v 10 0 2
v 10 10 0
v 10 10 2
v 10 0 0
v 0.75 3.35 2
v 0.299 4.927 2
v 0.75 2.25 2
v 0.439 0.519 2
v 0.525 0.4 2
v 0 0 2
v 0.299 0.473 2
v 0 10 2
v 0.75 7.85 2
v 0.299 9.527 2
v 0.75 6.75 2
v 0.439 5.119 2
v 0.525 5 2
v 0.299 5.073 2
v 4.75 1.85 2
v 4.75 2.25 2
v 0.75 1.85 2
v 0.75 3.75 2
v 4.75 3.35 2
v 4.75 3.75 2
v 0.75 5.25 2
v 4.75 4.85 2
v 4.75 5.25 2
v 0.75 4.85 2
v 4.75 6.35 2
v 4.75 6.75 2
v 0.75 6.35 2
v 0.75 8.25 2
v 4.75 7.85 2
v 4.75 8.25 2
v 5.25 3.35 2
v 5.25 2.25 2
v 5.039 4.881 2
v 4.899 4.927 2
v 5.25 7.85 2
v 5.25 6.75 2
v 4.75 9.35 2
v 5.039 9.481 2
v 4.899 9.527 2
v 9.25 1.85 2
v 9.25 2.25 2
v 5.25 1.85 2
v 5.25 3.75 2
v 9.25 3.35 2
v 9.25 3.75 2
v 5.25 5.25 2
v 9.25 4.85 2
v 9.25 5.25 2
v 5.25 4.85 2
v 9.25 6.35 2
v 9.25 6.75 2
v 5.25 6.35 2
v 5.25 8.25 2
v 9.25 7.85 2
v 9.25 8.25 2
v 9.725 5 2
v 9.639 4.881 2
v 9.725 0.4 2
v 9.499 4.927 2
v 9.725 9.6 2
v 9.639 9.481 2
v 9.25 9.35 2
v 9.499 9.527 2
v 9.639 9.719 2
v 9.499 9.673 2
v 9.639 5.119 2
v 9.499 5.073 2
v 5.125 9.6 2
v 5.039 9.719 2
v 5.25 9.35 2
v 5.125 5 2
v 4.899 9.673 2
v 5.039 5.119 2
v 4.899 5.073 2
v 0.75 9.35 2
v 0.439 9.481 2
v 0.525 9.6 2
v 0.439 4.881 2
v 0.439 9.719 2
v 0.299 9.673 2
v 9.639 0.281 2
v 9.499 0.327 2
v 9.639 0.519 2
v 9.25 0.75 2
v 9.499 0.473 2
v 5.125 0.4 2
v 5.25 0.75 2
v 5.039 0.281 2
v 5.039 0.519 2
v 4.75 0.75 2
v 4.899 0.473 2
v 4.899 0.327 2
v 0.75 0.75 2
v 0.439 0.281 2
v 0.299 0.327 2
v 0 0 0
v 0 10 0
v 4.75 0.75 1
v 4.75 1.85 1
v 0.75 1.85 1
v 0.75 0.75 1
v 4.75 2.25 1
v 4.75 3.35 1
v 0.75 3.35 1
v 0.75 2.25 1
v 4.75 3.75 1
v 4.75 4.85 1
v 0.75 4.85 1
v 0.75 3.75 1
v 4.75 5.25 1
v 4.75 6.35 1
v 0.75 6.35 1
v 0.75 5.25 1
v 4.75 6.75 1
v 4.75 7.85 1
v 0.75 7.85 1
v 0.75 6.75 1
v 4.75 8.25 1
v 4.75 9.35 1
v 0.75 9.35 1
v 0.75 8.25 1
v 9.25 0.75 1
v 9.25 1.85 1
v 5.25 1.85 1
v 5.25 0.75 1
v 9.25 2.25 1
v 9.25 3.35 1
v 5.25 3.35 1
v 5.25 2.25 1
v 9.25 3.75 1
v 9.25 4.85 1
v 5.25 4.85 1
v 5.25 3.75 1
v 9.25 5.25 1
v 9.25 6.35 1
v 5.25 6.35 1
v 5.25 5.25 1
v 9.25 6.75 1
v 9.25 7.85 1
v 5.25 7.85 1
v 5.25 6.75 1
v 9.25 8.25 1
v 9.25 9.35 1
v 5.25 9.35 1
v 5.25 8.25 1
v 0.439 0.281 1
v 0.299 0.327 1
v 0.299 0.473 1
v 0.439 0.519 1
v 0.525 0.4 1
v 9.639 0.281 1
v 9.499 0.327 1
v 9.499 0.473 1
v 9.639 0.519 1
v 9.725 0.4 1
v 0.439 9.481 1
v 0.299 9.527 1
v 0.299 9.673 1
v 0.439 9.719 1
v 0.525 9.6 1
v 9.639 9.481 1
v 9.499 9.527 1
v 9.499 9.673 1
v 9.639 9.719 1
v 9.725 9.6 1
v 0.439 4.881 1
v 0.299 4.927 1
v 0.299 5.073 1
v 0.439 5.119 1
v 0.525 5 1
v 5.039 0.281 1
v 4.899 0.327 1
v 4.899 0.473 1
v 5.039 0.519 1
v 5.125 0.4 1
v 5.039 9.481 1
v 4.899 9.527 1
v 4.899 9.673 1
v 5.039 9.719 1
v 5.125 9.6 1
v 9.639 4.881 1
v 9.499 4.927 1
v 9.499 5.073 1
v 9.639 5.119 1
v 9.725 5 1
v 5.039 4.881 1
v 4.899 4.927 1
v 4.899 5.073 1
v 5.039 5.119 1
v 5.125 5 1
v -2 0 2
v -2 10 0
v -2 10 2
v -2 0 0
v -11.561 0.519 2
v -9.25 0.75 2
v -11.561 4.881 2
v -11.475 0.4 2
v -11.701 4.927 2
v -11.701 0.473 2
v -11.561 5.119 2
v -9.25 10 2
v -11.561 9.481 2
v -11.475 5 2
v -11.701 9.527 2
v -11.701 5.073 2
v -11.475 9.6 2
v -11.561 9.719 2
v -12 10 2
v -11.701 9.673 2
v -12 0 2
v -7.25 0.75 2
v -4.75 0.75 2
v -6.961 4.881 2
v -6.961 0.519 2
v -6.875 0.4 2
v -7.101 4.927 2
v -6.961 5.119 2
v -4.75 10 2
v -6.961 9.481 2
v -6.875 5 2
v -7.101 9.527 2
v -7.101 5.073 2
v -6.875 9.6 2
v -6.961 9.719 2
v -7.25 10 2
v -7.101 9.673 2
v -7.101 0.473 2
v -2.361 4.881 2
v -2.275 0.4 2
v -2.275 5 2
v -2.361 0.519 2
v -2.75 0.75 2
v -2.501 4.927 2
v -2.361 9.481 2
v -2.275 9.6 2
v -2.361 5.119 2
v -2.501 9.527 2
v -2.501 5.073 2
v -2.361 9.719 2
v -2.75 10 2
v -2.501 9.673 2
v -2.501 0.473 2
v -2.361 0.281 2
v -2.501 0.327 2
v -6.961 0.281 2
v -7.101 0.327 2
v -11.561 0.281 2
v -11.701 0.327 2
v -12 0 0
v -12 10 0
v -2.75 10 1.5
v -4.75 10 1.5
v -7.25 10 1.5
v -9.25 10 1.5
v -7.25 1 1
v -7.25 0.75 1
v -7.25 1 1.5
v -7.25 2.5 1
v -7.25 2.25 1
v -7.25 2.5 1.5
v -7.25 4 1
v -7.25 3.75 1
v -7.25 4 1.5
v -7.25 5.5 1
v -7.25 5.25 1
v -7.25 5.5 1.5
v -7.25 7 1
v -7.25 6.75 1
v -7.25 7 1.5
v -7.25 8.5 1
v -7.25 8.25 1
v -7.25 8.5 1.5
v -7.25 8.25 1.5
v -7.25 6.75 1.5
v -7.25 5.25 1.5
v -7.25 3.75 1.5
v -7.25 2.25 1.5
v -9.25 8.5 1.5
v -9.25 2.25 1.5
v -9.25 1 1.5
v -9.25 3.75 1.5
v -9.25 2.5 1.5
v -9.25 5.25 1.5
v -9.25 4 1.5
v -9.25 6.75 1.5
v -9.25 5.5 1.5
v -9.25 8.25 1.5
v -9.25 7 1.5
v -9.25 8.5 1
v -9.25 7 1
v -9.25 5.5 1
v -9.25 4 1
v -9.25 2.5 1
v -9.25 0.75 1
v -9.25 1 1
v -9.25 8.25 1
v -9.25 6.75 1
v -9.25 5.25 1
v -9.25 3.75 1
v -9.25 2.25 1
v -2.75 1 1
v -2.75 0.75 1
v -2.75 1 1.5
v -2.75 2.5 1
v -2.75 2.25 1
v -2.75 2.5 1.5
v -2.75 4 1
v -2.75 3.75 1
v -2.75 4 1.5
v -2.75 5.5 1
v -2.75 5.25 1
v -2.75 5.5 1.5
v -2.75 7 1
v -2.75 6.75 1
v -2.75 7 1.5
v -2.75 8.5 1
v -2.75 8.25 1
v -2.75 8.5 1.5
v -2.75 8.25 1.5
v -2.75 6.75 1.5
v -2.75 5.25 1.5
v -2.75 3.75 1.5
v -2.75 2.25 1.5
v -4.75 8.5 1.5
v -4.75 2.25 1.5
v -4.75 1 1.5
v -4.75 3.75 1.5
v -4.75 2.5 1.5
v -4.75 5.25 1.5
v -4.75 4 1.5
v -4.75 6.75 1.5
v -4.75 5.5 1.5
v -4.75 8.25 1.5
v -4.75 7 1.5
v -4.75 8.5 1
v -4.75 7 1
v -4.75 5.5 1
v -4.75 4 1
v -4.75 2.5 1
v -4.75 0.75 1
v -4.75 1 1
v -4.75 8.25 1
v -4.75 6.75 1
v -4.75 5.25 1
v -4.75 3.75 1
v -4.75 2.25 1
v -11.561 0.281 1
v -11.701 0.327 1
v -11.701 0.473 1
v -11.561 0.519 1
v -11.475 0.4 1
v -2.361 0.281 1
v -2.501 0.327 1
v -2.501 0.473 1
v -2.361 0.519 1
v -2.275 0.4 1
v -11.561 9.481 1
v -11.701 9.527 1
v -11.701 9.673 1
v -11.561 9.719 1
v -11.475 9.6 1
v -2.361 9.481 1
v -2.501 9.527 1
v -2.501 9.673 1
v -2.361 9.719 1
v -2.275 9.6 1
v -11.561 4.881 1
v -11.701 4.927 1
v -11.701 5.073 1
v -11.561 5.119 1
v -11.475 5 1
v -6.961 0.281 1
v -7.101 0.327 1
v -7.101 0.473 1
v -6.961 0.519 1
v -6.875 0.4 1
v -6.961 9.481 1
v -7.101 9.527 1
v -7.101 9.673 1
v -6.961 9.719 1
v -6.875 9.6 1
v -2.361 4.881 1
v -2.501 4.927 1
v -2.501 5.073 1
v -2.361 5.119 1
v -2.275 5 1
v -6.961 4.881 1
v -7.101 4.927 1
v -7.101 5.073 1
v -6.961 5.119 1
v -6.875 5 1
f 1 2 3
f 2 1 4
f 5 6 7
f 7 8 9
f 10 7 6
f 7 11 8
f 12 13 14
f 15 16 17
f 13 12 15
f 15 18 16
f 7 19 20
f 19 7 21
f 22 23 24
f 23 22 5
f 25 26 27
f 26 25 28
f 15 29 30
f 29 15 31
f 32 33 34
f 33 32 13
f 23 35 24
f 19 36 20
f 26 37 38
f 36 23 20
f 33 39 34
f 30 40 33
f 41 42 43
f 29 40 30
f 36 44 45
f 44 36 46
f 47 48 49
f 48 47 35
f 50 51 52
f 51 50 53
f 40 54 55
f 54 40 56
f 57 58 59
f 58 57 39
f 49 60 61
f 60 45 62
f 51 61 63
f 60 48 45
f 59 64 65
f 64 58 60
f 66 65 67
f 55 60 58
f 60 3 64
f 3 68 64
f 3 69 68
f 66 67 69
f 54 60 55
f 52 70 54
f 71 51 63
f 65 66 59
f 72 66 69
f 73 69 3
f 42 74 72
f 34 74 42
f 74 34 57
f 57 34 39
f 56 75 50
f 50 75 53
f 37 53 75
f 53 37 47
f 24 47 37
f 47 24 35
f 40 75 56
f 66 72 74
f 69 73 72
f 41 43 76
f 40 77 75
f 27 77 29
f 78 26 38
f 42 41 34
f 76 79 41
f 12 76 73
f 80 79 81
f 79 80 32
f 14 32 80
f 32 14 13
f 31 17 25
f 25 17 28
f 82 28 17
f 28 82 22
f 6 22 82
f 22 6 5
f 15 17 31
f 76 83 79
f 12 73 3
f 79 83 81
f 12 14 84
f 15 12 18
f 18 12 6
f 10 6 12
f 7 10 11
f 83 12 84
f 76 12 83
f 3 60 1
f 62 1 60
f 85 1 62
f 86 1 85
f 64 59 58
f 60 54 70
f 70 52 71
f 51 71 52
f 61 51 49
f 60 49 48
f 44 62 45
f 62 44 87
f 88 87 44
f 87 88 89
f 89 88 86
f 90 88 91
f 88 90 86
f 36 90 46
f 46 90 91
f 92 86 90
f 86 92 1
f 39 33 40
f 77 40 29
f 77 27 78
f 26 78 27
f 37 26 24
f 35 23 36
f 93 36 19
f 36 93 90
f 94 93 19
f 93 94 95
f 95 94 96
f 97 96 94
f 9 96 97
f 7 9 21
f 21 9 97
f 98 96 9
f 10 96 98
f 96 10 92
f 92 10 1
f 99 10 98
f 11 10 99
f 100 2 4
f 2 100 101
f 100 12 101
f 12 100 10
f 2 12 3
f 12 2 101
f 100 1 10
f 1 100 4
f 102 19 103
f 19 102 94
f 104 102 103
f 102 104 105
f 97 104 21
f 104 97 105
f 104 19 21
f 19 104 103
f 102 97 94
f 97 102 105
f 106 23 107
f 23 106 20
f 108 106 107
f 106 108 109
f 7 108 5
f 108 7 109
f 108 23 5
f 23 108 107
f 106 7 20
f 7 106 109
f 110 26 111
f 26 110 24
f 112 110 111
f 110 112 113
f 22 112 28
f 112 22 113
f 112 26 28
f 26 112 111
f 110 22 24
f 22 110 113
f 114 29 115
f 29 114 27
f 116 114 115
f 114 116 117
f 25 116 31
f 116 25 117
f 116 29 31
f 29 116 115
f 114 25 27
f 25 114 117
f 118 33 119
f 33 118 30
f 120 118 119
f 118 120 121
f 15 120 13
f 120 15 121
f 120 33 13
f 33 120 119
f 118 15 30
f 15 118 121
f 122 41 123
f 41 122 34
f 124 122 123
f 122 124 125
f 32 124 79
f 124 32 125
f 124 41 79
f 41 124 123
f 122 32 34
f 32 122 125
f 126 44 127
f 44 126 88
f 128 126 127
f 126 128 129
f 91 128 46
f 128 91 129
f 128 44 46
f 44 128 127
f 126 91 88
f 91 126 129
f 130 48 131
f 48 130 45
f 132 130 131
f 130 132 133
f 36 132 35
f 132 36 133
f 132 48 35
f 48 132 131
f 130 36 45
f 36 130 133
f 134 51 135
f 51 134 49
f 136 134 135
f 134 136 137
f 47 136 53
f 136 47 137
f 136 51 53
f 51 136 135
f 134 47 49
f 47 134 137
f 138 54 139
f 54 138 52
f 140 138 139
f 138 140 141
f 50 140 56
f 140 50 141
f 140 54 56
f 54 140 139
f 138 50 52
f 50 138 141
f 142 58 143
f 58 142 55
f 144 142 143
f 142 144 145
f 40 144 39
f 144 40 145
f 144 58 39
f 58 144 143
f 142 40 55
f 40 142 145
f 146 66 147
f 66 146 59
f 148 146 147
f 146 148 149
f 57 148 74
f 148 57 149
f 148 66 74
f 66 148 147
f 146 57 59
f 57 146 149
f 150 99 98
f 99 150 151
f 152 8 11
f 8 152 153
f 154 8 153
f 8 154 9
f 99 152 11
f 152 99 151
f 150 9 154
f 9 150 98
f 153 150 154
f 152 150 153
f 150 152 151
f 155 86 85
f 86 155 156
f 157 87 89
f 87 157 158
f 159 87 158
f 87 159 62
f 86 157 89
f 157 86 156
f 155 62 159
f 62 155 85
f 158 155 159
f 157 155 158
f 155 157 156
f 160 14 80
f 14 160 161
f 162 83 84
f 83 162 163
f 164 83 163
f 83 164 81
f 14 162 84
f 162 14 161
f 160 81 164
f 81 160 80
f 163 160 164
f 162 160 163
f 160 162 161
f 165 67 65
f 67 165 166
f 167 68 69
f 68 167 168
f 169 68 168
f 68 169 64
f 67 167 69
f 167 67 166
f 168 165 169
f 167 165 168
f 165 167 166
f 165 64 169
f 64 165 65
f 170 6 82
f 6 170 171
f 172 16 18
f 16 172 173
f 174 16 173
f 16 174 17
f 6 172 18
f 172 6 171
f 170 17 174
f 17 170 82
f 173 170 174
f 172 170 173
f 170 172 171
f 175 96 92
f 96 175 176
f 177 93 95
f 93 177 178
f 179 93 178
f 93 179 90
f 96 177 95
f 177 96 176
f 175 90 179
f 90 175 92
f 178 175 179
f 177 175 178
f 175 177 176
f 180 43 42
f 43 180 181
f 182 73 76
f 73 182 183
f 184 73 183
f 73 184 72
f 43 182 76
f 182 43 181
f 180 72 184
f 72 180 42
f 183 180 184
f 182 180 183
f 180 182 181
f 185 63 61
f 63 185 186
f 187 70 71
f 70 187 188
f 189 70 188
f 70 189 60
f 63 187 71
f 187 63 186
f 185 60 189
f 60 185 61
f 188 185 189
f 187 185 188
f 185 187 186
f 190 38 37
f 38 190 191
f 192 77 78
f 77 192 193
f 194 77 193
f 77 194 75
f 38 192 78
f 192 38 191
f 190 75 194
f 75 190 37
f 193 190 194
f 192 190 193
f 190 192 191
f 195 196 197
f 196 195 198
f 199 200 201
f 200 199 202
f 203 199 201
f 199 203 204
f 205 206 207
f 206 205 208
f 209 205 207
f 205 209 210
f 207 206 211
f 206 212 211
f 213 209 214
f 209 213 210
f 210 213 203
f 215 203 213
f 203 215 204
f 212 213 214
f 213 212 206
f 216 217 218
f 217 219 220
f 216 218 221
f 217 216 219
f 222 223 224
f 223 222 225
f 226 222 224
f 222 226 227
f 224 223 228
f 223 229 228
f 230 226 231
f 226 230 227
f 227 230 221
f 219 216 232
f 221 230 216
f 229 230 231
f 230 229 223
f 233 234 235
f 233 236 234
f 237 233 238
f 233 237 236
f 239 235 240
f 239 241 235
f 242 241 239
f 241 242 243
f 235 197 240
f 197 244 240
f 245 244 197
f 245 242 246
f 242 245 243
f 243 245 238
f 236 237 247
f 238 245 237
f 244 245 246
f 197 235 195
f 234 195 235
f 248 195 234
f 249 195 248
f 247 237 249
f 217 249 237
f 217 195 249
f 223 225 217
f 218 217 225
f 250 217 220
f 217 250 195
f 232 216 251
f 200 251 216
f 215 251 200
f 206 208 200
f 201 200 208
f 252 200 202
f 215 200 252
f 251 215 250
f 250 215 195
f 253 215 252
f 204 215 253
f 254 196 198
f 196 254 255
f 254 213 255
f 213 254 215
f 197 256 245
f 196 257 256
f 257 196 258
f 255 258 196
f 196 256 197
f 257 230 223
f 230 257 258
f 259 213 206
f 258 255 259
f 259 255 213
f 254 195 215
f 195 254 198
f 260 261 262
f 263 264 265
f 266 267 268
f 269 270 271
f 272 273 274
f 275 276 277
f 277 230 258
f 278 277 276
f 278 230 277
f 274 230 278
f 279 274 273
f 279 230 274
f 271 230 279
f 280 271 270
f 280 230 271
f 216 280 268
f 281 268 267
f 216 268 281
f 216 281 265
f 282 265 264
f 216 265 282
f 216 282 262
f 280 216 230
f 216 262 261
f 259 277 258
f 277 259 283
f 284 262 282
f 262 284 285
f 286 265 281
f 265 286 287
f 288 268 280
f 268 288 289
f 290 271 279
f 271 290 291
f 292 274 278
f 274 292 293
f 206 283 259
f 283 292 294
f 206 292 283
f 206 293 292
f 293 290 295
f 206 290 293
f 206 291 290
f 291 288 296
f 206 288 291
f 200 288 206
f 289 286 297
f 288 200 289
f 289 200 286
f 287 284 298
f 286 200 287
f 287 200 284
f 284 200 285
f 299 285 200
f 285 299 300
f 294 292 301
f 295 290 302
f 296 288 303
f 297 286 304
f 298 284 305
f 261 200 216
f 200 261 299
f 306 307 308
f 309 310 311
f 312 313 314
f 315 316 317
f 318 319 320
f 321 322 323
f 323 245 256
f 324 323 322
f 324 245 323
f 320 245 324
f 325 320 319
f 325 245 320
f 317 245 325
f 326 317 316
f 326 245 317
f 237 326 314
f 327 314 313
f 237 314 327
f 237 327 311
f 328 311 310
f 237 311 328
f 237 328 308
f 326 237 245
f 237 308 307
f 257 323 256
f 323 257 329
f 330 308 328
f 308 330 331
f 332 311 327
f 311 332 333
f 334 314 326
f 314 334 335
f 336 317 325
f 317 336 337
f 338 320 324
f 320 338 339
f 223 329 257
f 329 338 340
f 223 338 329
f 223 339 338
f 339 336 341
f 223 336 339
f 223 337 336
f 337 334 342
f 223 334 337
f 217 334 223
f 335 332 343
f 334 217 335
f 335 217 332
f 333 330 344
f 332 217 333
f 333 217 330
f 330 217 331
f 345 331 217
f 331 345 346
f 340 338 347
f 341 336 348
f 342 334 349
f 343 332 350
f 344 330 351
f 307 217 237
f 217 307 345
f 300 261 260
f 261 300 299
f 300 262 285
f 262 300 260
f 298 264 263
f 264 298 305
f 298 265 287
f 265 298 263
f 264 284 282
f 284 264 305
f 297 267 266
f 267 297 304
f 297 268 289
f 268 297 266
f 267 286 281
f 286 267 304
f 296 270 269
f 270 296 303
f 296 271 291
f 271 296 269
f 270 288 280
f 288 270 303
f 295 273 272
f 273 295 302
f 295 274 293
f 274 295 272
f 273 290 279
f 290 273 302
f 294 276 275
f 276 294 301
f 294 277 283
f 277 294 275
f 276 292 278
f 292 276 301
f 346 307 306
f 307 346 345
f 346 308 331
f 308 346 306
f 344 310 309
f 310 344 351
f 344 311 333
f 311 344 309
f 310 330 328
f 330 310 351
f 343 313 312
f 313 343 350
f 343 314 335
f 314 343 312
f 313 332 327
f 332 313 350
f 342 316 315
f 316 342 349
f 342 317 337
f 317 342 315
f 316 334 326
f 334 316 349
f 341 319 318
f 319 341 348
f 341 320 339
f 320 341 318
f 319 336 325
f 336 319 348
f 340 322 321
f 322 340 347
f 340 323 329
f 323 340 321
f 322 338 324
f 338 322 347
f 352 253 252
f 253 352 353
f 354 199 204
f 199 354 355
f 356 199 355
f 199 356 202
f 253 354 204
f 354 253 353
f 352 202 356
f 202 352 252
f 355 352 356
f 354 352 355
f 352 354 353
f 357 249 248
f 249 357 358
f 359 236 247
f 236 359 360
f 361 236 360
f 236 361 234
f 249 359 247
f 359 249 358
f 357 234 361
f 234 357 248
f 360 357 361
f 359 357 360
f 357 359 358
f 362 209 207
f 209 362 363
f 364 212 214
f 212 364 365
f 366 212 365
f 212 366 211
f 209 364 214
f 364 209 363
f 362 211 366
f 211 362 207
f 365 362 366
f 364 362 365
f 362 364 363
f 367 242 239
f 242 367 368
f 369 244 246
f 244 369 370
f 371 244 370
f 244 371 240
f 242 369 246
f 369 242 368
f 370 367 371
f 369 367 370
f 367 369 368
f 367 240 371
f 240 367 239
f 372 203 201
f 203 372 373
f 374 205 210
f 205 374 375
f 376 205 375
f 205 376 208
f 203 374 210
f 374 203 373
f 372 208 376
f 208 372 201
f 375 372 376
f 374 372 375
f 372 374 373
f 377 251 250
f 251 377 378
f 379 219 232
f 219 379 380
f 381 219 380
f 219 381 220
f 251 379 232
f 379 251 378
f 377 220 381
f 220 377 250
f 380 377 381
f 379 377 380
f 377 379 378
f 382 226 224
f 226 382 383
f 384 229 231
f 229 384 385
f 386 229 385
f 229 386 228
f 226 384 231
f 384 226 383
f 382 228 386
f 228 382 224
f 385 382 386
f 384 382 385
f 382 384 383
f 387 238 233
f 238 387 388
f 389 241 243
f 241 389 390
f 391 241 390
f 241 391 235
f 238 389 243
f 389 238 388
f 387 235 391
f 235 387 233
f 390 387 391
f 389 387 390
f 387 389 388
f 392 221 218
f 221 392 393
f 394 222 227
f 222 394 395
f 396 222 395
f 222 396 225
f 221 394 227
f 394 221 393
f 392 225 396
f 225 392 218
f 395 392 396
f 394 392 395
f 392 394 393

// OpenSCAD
Top();
translate([-12,0,0]) Bottom();

Width=10;
Length=10;
Height=2;

//drive offset
DriveOffsetX1=0.75;
DriveOffsetX2=5.25;
DriveOffsetY=0;
DriveOffsetZ=1;

//drive spacing
DriveSpace=0.4;
DriveInset=1;

//drive demintions
DriveLength=5.75;
DriveWidth=4;
DriveHeight=1.1;

//supports
SupportOffset=0.4;
SupportRadius=1/8;

//bottom cutouts
cablegrooveX=0;
connectorCutX=2;
connectorCutY=0.25;
connectorCutZ=1;
connectorOffX1=DriveOffsetX1+DriveWidth-connectorCutX;
connectorOffX2=DriveOffsetX2+DriveWidth-connectorCutX;

module Top()
{
difference()
	{
	cube([Width,Length,Height]);
	translate([DriveOffsetX1,0.75+DriveSpace*0+DriveHeight*0,DriveOffsetZ]) cube([DriveWidth,DriveHeight,DriveInset]);
	translate([DriveOffsetX1,0.75+DriveSpace*1+DriveHeight*1,DriveOffsetZ]) cube([DriveWidth,DriveHeight,DriveInset]);
	translate([DriveOffsetX1,0.75+DriveSpace*2+DriveHeight*2,DriveOffsetZ]) cube([DriveWidth,DriveHeight,DriveInset]);
	translate([DriveOffsetX1,0.75+DriveSpace*3+DriveHeight*3,DriveOffsetZ]) cube([DriveWidth,DriveHeight,DriveInset]);
	translate([DriveOffsetX1,0.75+DriveSpace*4+DriveHeight*4,DriveOffsetZ]) cube([DriveWidth,DriveHeight,DriveInset]);
	translate([DriveOffsetX1,0.75+DriveSpace*5+DriveHeight*5,DriveOffsetZ]) cube([DriveWidth,DriveHeight,DriveInset]);

	translate([DriveOffsetX2,0.75+DriveSpace*0+DriveHeight*0,DriveOffsetZ]) cube([DriveWidth,DriveHeight,DriveInset]);
	translate([DriveOffsetX2,0.75+DriveSpace*1+DriveHeight*1,DriveOffsetZ]) cube([DriveWidth,DriveHeight,DriveInset]);
	translate([DriveOffsetX2,0.75+DriveSpace*2+DriveHeight*2,DriveOffsetZ]) cube([DriveWidth,DriveHeight,DriveInset]);
	translate([DriveOffsetX2,0.75+DriveSpace*3+DriveHeight*3,DriveOffsetZ]) cube([DriveWidth,DriveHeight,DriveInset]);
	translate([DriveOffsetX2,0.75+DriveSpace*4+DriveHeight*4,DriveOffsetZ]) cube([DriveWidth,DriveHeight,DriveInset]);
	translate([DriveOffsetX2,0.75+DriveSpace*5+DriveHeight*5,DriveOffsetZ]) cube([DriveWidth,DriveHeight,DriveInset]);

	translate([SupportOffset,SupportOffset,1]) cylinder (h=1,r=SupportRadius);
	translate([Width-SupportOffset,SupportOffset,1]) cylinder (h=1,r=SupportRadius);
	translate([SupportOffset,Length-SupportOffset,1]) cylinder (h=1,r=SupportRadius);
	translate([Width-SupportOffset,Length-SupportOffset,1]) cylinder (h=1,r=SupportRadius);

	translate([SupportOffset,Length/2,1]) cylinder (h=1,r=SupportRadius);
	translate([Width/2,SupportOffset,1]) cylinder (h=1,r=SupportRadius);
	translate([Width/2,Length-SupportOffset,1]) cylinder (h=1,r=SupportRadius);
	translate([Width-SupportOffset,Length/2,1]) cylinder (h=1,r=SupportRadius);

	translate([Width/2,Length/2,1]) cylinder (h=1,r=SupportRadius);
	}
}

module Bottom()
{
difference()
	{
	cube([Width,Length,Height]);
	translate([2.75,.75,1.5]) cube([connectorCutX,11.25,0.5]);
	translate([7.25,.75,1.5]) cube([connectorCutX,11.25,0.5]);

	translate([connectorOffX1,0.75+DriveSpace*0+DriveHeight*0,DriveOffsetZ]) cube([connectorCutX,connectorCutY,connectorCutZ]);
	translate([connectorOffX1,0.75+DriveSpace*1+DriveHeight*1,DriveOffsetZ]) cube([connectorCutX,connectorCutY,connectorCutZ]);
	translate([connectorOffX1,0.75+DriveSpace*2+DriveHeight*2,DriveOffsetZ]) cube([connectorCutX,connectorCutY,connectorCutZ]);
	translate([connectorOffX1,0.75+DriveSpace*3+DriveHeight*3,DriveOffsetZ]) cube([connectorCutX,connectorCutY,connectorCutZ]);
	translate([connectorOffX1,0.75+DriveSpace*4+DriveHeight*4,DriveOffsetZ]) cube([connectorCutX,connectorCutY,connectorCutZ]);
	translate([connectorOffX1,0.75+DriveSpace*5+DriveHeight*5,DriveOffsetZ]) cube([connectorCutX,connectorCutY,connectorCutZ]);

	translate([connectorOffX2,0.75+DriveSpace*0+DriveHeight*0,DriveOffsetZ]) cube([connectorCutX,connectorCutY,connectorCutZ]);
	translate([connectorOffX2,0.75+DriveSpace*1+DriveHeight*1,DriveOffsetZ]) cube([connectorCutX,connectorCutY,connectorCutZ]);
	translate([connectorOffX2,0.75+DriveSpace*2+DriveHeight*2,DriveOffsetZ]) cube([connectorCutX,connectorCutY,connectorCutZ]);
	translate([connectorOffX2,0.75+DriveSpace*3+DriveHeight*3,DriveOffsetZ]) cube([connectorCutX,connectorCutY,connectorCutZ]);
	translate([connectorOffX2,0.75+DriveSpace*4+DriveHeight*4,DriveOffsetZ]) cube([connectorCutX,connectorCutY,connectorCutZ]);
	translate([connectorOffX2,0.75+DriveSpace*5+DriveHeight*5,DriveOffsetZ]) cube([connectorCutX,connectorCutY,connectorCutZ]);

	translate([SupportOffset,SupportOffset,1]) cylinder (h=1,r=SupportRadius);
	translate([Width-SupportOffset,SupportOffset,1]) cylinder (h=1,r=SupportRadius);
	translate([SupportOffset,Length-SupportOffset,1]) cylinder (h=1,r=SupportRadius);
	translate([Width-SupportOffset,Length-SupportOffset,1]) cylinder (h=1,r=SupportRadius);

	translate([SupportOffset,Length/2,1]) cylinder (h=1,r=SupportRadius);
	translate([Width/2,SupportOffset,1]) cylinder (h=1,r=SupportRadius);
	translate([Width/2,Length-SupportOffset,1]) cylinder (h=1,r=SupportRadius);
	translate([Width-SupportOffset,Length/2,1]) cylinder (h=1,r=SupportRadius);

	translate([Width/2,Length/2,1]) cylinder (h=1,r=SupportRadius);
	}
}
